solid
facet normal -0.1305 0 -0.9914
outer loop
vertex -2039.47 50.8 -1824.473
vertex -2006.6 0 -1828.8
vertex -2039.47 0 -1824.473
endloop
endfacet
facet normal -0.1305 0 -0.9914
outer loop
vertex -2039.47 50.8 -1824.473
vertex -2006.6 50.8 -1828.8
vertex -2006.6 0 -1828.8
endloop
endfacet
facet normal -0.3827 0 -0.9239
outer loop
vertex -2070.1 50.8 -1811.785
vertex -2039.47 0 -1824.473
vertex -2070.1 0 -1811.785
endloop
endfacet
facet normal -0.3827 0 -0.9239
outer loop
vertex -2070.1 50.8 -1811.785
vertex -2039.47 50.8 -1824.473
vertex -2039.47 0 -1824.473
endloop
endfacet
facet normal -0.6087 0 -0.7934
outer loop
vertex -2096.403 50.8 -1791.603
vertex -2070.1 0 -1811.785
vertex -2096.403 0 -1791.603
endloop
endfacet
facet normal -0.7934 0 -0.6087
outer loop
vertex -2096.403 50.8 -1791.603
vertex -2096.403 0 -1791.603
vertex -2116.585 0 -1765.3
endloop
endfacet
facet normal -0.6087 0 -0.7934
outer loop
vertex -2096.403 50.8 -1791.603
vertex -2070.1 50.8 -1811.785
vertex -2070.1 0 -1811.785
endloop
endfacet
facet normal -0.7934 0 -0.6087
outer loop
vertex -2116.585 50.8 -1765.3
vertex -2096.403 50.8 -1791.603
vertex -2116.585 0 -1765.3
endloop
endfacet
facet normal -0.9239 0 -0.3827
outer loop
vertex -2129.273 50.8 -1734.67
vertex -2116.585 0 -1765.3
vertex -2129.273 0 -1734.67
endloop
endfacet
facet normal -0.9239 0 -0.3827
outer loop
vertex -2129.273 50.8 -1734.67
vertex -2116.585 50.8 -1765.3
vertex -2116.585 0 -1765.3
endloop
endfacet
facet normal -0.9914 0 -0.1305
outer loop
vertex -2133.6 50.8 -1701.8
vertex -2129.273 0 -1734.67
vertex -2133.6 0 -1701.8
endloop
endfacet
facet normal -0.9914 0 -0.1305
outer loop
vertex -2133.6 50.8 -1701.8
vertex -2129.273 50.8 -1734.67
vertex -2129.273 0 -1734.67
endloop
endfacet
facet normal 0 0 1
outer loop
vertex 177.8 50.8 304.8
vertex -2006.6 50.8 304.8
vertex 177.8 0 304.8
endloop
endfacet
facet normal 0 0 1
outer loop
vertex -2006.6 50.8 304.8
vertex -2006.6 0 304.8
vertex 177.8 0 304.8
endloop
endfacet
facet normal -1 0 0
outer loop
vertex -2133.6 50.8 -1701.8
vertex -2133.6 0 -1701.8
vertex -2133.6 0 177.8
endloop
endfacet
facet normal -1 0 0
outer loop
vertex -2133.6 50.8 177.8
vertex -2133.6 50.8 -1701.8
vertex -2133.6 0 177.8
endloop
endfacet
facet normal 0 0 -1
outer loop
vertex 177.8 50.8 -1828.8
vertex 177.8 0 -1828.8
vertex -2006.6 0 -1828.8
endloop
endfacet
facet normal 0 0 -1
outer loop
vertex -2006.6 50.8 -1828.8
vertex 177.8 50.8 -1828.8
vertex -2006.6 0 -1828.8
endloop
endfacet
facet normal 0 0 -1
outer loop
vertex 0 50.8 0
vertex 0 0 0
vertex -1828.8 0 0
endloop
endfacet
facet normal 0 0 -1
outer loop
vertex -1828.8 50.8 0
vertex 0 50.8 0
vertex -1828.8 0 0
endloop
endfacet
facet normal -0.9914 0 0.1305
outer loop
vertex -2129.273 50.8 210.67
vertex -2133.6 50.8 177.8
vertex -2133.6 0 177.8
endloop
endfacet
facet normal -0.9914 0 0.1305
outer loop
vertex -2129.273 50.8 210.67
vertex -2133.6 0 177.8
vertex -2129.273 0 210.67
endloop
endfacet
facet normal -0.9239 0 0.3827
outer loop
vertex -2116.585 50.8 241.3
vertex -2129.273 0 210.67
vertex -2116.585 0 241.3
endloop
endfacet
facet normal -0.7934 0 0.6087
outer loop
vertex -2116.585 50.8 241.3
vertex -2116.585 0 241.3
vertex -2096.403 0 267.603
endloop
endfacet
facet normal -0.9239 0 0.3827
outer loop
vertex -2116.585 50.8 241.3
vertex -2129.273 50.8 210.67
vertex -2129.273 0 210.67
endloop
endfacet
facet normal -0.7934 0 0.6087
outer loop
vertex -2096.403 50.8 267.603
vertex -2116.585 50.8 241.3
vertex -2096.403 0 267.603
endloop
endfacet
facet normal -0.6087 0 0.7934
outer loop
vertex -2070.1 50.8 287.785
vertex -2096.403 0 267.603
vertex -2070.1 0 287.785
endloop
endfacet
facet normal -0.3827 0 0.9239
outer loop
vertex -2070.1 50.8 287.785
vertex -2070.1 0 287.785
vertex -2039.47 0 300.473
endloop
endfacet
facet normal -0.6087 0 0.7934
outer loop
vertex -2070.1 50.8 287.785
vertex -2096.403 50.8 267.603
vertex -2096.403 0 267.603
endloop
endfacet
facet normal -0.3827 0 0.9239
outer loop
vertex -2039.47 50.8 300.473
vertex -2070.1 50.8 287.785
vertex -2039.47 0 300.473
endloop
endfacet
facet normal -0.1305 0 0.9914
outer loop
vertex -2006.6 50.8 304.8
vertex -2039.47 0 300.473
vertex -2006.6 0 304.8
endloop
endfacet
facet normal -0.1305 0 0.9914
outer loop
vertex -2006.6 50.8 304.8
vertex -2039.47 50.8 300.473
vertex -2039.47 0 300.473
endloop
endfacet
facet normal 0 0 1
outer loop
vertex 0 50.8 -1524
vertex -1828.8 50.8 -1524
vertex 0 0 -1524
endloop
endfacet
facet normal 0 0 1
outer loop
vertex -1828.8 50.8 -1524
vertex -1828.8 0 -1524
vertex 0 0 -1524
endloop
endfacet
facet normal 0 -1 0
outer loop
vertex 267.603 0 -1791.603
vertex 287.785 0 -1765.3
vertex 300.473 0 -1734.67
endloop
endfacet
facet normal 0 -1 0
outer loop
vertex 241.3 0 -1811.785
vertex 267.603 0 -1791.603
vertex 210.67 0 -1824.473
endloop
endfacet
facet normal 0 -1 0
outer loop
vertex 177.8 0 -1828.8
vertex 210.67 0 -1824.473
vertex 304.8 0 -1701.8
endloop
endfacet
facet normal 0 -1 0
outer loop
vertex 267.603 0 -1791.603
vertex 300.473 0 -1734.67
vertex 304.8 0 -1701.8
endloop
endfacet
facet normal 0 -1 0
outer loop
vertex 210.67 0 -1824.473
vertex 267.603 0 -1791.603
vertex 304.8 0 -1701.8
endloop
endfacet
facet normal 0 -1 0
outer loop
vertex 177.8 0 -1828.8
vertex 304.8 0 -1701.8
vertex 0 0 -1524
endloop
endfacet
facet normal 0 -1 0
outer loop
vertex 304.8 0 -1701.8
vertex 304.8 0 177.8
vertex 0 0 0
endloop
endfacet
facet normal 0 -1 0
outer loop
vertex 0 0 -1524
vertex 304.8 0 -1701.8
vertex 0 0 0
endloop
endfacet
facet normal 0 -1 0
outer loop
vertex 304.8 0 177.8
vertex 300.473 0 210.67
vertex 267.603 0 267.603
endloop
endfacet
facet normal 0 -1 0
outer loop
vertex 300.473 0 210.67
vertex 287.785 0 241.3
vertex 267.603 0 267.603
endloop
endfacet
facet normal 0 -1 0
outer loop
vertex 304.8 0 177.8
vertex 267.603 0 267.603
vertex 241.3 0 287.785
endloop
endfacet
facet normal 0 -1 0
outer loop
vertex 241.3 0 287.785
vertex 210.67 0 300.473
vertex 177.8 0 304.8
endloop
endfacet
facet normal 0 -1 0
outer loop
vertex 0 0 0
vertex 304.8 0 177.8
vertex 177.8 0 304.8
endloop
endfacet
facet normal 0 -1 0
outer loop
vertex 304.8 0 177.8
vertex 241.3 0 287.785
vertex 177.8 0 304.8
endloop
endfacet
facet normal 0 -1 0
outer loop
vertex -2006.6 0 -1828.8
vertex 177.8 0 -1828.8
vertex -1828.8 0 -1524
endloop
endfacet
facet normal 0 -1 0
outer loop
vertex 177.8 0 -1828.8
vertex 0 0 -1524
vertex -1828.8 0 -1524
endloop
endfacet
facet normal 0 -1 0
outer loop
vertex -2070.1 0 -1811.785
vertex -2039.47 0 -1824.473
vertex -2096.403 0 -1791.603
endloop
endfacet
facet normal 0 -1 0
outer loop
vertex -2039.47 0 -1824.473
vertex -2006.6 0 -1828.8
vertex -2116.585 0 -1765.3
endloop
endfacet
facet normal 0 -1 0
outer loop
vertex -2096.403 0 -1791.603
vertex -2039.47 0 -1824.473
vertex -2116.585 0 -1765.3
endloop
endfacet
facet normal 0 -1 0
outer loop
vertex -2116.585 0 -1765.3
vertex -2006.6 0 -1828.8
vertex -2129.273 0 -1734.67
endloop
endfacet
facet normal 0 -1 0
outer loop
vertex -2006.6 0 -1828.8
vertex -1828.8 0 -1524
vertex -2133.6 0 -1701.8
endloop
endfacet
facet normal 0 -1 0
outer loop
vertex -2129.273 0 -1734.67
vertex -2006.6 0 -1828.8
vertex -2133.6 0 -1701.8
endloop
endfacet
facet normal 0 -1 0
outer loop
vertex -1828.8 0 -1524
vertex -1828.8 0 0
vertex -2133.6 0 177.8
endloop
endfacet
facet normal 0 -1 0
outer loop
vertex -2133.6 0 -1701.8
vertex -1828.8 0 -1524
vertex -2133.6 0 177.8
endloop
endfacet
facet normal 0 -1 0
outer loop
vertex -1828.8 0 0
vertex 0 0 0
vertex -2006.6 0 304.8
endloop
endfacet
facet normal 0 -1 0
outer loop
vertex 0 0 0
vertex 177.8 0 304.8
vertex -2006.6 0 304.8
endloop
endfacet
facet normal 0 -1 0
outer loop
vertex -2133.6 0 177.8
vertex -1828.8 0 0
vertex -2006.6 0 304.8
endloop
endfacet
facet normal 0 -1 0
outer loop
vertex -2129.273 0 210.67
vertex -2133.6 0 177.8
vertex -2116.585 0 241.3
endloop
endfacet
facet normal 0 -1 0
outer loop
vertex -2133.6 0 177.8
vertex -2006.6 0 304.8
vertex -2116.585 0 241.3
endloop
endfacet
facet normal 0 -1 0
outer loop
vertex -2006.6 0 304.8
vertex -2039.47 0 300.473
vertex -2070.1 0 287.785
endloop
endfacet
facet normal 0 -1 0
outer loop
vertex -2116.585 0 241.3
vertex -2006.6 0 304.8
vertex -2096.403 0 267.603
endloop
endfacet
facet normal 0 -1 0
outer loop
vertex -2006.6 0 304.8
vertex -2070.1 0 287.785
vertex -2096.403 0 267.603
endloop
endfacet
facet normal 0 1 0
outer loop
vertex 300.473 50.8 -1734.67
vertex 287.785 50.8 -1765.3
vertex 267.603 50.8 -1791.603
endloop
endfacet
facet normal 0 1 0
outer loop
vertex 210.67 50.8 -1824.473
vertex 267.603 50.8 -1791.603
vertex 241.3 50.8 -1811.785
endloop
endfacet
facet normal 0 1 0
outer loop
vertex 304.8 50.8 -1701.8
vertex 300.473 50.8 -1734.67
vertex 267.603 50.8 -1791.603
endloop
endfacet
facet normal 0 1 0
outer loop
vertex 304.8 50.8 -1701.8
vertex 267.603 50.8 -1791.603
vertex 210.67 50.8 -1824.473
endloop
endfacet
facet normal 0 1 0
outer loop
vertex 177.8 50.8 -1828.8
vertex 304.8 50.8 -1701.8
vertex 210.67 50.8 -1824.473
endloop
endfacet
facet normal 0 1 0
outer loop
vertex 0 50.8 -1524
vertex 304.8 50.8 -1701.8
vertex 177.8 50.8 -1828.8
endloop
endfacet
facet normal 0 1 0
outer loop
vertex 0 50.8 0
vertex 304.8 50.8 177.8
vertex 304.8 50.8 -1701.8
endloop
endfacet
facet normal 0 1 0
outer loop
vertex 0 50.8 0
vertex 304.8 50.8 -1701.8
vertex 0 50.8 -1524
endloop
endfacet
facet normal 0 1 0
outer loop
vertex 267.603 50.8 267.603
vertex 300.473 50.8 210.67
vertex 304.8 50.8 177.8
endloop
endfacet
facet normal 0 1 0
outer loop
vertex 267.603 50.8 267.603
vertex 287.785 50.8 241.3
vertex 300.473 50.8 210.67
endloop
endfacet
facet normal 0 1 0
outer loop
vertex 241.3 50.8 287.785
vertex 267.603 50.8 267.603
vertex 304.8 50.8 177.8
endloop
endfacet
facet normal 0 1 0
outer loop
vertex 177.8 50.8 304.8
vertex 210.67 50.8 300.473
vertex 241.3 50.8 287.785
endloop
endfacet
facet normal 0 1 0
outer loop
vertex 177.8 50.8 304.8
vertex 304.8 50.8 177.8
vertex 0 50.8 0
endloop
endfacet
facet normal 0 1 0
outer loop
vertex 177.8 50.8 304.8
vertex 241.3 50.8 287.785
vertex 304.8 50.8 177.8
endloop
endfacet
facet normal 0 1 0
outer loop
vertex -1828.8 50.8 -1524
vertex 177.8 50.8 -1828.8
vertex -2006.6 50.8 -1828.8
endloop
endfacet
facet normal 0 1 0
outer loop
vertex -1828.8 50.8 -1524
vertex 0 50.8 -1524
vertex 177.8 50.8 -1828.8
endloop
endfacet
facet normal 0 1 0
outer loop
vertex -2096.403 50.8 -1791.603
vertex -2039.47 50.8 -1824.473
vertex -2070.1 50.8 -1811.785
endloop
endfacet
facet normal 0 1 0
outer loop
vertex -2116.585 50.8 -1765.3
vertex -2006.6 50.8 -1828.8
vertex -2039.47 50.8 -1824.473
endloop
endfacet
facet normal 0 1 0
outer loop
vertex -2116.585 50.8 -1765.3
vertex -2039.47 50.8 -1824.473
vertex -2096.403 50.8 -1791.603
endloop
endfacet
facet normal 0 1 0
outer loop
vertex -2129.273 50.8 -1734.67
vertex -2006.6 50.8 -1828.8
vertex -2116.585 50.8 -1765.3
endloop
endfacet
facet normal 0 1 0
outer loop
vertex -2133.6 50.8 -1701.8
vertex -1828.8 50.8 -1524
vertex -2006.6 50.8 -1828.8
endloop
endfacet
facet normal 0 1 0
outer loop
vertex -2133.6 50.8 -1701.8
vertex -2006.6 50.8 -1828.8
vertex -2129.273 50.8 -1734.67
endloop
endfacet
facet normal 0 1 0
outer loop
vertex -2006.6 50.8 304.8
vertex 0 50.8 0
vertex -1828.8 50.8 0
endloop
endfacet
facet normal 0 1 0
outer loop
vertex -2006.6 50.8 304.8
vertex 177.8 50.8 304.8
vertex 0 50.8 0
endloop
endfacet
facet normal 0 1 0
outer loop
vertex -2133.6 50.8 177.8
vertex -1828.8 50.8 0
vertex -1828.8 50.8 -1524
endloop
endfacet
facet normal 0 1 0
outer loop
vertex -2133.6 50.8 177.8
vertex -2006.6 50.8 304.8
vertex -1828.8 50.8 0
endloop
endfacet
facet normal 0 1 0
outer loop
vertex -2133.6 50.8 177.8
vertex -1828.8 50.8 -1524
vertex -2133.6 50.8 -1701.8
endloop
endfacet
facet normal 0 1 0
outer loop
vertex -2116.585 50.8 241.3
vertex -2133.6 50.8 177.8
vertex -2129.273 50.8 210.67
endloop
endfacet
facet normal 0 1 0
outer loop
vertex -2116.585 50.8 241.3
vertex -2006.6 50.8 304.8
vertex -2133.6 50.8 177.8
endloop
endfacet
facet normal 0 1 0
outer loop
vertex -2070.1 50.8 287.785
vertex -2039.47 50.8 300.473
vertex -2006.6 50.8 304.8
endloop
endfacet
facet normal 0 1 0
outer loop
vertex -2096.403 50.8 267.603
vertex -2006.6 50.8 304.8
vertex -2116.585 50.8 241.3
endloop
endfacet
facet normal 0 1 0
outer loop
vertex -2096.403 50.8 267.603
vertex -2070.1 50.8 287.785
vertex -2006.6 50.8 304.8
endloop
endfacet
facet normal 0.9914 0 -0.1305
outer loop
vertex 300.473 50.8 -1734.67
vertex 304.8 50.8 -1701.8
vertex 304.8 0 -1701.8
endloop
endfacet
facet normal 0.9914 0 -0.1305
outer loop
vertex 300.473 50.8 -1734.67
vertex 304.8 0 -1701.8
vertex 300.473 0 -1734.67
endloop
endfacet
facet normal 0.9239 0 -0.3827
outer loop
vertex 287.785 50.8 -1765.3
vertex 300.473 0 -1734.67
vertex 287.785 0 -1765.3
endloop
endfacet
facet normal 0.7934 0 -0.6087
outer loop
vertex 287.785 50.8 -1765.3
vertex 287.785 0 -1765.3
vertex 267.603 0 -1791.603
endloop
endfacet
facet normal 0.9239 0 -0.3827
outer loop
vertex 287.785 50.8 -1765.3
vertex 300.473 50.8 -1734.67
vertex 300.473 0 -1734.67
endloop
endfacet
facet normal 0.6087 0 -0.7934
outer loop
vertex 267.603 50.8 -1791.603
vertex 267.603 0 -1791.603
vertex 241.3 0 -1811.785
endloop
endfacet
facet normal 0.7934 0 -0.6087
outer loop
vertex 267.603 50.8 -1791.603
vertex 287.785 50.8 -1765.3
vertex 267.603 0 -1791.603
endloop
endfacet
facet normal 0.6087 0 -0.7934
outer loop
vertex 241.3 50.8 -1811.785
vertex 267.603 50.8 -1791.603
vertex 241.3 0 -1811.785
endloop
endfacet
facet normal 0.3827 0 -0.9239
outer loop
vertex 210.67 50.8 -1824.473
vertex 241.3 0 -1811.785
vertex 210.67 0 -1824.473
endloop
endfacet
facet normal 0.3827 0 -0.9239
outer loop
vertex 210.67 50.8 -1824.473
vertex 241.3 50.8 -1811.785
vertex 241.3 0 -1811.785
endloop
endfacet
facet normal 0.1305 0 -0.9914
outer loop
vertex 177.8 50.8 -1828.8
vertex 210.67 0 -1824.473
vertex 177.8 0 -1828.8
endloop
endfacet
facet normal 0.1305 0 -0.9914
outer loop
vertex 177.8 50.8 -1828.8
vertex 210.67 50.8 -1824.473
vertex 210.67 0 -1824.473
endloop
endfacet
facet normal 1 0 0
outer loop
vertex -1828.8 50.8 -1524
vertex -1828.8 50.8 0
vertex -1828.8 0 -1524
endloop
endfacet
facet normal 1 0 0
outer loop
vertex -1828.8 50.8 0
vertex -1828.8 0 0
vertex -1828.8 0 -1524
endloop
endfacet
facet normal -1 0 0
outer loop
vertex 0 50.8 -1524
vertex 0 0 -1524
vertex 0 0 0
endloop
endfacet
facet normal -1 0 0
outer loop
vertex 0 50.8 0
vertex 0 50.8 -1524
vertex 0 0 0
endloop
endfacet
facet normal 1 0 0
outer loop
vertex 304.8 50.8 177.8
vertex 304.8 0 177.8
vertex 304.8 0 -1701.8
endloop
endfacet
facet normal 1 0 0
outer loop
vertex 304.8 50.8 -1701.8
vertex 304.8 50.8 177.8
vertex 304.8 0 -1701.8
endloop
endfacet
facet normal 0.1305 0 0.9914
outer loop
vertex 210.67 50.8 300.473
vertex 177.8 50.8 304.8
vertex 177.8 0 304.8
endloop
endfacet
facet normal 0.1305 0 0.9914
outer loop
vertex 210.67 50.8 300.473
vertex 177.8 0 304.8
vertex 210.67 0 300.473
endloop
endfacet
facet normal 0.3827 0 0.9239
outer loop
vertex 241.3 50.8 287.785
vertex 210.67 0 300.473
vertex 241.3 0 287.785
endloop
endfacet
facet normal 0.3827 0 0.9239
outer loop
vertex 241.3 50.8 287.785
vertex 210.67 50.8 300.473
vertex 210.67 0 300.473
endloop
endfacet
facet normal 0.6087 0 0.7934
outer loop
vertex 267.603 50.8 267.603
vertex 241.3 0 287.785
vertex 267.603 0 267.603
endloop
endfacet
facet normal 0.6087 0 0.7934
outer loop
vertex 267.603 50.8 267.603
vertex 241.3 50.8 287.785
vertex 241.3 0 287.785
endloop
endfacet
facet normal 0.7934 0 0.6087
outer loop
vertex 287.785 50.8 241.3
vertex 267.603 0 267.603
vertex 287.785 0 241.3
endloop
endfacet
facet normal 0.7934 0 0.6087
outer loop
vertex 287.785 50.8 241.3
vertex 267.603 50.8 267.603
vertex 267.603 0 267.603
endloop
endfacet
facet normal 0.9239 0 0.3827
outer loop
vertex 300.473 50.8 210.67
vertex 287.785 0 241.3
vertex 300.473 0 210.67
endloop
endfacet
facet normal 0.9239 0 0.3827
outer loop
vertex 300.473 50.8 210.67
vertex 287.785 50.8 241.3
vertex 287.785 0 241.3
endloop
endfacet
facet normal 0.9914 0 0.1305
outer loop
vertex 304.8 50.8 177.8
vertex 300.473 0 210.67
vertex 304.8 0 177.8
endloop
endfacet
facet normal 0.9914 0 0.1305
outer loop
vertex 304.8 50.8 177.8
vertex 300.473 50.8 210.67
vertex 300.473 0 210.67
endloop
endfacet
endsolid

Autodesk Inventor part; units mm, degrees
ref_plane "YZ Plane" through (0, 0, 0) normal (1, 0, 0) x (0, 1, 0)
ref_plane "XZ Plane" through (0, 0, 0) normal (0, 1, 0) x (-1, 0, 0)
ref_plane "XY Plane" through (0, 0, 0) normal (0, 0, 1) x (1, 0, 0)
sketch "Sketch1" plane through (0, 0, 0) normal (0, 1, 0) x (-1, 0, 0)
  line L0 (0, 0) -> (1828.8, 0)
  line L1 (1828.8, 0) -> (1828.8, -1524)
  line L2 (1828.8, -1524) -> (0, -1524)
  line L3 (0, -1524) -> (0, 0)
  line L4 (2133.6, 304.8) -> (-304.8, 304.8)
  line L5 (-304.8, 304.8) -> (-304.8, -1828.8)
  line L6 (-304.8, -1828.8) -> (2133.6, -1828.8)
  line L7 (2133.6, -1828.8) -> (2133.6, 304.8)
  dimension "d0" = 1828.8
  dimension "d1" = 1524
  dimension "d2" = 304.8
  dimension "d3" = 304.8
  dimension "d4" = 304.8
  dimension "d5" = 304.8
extrude "Extrusion1" add sketch "Sketch1" along normal blind 50.8
fillet "Fillet1" radius 127 1 edges at (304.8, 25.4, 304.8)
fillet "Fillet2" radius 127 1 edges at (304.8, 25.4, -1828.8)
fillet "Fillet3" radius 127 1 edges at (-2133.6, 25.4, -1828.8)
fillet "Fillet4" radius 127 1 edges at (-2133.6, 25.4, 304.8)
properties part number "Border" material "Rubber"
